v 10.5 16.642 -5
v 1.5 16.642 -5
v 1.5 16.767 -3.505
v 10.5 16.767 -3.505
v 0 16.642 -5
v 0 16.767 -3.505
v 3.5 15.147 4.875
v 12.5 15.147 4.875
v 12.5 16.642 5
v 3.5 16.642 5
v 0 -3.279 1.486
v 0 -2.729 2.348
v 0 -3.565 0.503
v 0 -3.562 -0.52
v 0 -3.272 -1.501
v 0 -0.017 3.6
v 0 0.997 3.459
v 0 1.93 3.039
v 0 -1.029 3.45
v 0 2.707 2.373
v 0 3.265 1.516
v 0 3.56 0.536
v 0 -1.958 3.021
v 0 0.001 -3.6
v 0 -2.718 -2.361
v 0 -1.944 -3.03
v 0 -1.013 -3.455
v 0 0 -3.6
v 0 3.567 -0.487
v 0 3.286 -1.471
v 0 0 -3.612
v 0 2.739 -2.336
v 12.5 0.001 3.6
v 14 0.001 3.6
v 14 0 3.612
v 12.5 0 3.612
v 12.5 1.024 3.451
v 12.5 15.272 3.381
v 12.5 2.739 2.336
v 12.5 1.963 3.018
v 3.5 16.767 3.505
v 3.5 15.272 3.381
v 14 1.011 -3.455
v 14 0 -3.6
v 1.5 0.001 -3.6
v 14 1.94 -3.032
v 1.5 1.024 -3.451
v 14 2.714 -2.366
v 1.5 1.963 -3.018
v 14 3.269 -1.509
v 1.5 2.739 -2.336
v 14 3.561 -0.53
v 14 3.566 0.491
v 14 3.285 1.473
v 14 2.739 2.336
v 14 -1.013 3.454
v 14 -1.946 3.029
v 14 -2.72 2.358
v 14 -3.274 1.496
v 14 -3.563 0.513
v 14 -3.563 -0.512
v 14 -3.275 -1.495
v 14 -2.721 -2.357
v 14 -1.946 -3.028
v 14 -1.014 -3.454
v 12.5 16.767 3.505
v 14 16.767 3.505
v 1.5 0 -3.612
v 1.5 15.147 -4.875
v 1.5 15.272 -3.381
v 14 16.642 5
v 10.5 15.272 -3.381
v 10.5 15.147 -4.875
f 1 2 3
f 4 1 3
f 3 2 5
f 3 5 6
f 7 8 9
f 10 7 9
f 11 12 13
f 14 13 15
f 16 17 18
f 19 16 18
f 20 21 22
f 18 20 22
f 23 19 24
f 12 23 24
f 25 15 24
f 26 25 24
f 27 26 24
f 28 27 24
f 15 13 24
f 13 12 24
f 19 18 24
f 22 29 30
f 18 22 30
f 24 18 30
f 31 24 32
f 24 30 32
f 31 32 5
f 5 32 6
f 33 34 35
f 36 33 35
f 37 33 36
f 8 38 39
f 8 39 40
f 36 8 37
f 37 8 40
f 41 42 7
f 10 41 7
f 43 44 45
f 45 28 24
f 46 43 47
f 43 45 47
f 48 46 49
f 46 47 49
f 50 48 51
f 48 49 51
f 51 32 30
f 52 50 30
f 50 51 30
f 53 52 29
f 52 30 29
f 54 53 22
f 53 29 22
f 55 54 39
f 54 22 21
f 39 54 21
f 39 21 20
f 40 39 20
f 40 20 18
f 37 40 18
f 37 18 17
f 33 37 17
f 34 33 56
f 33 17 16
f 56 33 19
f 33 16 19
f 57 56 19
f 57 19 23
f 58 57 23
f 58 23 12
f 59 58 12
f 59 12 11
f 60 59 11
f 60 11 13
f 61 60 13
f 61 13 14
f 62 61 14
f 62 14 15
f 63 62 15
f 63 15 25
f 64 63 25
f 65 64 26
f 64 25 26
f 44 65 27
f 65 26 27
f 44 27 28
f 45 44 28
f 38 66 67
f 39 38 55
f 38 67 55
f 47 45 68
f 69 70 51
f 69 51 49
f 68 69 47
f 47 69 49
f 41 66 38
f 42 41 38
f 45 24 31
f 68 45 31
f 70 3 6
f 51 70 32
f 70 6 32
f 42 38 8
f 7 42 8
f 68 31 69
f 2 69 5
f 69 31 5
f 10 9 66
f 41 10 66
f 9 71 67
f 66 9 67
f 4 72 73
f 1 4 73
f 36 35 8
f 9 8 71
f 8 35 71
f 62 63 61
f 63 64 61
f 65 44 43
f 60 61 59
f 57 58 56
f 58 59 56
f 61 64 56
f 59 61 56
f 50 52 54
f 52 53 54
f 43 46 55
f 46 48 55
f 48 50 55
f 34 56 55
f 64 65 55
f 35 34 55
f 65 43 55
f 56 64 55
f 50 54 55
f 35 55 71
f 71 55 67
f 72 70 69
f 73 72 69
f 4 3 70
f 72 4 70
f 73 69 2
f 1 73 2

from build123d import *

# Parameters (mm, degrees)
SKETCH1_R           = 3.6
BOSS_EXTRUDE1_DEPTH = 14
BOSS_EXTRUDE2_DEPTH = 1.5
BOSS_EXTRUDE3_DEPTH = 9
CIRPATTERN1_COUNT   = 2


with BuildPart() as part:
    # Sketch1 → Boss-Extrude1 (new body)
    with BuildSketch(Plane(origin=(0, 0, 0), x_dir=(0, 0, -1), z_dir=(1, 0, 0))):
        Circle(SKETCH1_R)
    extrude(amount=BOSS_EXTRUDE1_DEPTH)

    # Sketch2 → Boss-Extrude2 (add)
    with BuildSketch(Plane.ZY):
        Polygon((-5, 16.642259954), (-3.505186232, 16.766886588), (-2.117676372, 0.124626634), (-3.61249014, 0), align=None)
    boss_extrude2 = extrude(amount=-BOSS_EXTRUDE2_DEPTH)

    # Sketch4 → Boss-Extrude3 (add)
    with BuildSketch(Plane(origin=(1.5, 0, 0), x_dir=(0, 0, -1), z_dir=(1, 0, 0))):
        Polygon((5, 16.642259954), (3.505186232, 16.766886588), (3.380559598, 15.27207282), (4.875373366, 15.147446186), align=None)
    boss_extrude3 = extrude(amount=BOSS_EXTRUDE3_DEPTH)

    # CirPattern1: Boss-Extrude2, Boss-Extrude3 ×2 about axis
    cirpattern1_axis = Axis((7, 17.785230918, 0), (0, -1, 0))
    add([boss_extrude2.rotate(cirpattern1_axis, i * 360 / CIRPATTERN1_COUNT) for i in range(1, CIRPATTERN1_COUNT)])
    add([boss_extrude3.rotate(cirpattern1_axis, i * 360 / CIRPATTERN1_COUNT) for i in range(1, CIRPATTERN1_COUNT)])


solid = part.part
